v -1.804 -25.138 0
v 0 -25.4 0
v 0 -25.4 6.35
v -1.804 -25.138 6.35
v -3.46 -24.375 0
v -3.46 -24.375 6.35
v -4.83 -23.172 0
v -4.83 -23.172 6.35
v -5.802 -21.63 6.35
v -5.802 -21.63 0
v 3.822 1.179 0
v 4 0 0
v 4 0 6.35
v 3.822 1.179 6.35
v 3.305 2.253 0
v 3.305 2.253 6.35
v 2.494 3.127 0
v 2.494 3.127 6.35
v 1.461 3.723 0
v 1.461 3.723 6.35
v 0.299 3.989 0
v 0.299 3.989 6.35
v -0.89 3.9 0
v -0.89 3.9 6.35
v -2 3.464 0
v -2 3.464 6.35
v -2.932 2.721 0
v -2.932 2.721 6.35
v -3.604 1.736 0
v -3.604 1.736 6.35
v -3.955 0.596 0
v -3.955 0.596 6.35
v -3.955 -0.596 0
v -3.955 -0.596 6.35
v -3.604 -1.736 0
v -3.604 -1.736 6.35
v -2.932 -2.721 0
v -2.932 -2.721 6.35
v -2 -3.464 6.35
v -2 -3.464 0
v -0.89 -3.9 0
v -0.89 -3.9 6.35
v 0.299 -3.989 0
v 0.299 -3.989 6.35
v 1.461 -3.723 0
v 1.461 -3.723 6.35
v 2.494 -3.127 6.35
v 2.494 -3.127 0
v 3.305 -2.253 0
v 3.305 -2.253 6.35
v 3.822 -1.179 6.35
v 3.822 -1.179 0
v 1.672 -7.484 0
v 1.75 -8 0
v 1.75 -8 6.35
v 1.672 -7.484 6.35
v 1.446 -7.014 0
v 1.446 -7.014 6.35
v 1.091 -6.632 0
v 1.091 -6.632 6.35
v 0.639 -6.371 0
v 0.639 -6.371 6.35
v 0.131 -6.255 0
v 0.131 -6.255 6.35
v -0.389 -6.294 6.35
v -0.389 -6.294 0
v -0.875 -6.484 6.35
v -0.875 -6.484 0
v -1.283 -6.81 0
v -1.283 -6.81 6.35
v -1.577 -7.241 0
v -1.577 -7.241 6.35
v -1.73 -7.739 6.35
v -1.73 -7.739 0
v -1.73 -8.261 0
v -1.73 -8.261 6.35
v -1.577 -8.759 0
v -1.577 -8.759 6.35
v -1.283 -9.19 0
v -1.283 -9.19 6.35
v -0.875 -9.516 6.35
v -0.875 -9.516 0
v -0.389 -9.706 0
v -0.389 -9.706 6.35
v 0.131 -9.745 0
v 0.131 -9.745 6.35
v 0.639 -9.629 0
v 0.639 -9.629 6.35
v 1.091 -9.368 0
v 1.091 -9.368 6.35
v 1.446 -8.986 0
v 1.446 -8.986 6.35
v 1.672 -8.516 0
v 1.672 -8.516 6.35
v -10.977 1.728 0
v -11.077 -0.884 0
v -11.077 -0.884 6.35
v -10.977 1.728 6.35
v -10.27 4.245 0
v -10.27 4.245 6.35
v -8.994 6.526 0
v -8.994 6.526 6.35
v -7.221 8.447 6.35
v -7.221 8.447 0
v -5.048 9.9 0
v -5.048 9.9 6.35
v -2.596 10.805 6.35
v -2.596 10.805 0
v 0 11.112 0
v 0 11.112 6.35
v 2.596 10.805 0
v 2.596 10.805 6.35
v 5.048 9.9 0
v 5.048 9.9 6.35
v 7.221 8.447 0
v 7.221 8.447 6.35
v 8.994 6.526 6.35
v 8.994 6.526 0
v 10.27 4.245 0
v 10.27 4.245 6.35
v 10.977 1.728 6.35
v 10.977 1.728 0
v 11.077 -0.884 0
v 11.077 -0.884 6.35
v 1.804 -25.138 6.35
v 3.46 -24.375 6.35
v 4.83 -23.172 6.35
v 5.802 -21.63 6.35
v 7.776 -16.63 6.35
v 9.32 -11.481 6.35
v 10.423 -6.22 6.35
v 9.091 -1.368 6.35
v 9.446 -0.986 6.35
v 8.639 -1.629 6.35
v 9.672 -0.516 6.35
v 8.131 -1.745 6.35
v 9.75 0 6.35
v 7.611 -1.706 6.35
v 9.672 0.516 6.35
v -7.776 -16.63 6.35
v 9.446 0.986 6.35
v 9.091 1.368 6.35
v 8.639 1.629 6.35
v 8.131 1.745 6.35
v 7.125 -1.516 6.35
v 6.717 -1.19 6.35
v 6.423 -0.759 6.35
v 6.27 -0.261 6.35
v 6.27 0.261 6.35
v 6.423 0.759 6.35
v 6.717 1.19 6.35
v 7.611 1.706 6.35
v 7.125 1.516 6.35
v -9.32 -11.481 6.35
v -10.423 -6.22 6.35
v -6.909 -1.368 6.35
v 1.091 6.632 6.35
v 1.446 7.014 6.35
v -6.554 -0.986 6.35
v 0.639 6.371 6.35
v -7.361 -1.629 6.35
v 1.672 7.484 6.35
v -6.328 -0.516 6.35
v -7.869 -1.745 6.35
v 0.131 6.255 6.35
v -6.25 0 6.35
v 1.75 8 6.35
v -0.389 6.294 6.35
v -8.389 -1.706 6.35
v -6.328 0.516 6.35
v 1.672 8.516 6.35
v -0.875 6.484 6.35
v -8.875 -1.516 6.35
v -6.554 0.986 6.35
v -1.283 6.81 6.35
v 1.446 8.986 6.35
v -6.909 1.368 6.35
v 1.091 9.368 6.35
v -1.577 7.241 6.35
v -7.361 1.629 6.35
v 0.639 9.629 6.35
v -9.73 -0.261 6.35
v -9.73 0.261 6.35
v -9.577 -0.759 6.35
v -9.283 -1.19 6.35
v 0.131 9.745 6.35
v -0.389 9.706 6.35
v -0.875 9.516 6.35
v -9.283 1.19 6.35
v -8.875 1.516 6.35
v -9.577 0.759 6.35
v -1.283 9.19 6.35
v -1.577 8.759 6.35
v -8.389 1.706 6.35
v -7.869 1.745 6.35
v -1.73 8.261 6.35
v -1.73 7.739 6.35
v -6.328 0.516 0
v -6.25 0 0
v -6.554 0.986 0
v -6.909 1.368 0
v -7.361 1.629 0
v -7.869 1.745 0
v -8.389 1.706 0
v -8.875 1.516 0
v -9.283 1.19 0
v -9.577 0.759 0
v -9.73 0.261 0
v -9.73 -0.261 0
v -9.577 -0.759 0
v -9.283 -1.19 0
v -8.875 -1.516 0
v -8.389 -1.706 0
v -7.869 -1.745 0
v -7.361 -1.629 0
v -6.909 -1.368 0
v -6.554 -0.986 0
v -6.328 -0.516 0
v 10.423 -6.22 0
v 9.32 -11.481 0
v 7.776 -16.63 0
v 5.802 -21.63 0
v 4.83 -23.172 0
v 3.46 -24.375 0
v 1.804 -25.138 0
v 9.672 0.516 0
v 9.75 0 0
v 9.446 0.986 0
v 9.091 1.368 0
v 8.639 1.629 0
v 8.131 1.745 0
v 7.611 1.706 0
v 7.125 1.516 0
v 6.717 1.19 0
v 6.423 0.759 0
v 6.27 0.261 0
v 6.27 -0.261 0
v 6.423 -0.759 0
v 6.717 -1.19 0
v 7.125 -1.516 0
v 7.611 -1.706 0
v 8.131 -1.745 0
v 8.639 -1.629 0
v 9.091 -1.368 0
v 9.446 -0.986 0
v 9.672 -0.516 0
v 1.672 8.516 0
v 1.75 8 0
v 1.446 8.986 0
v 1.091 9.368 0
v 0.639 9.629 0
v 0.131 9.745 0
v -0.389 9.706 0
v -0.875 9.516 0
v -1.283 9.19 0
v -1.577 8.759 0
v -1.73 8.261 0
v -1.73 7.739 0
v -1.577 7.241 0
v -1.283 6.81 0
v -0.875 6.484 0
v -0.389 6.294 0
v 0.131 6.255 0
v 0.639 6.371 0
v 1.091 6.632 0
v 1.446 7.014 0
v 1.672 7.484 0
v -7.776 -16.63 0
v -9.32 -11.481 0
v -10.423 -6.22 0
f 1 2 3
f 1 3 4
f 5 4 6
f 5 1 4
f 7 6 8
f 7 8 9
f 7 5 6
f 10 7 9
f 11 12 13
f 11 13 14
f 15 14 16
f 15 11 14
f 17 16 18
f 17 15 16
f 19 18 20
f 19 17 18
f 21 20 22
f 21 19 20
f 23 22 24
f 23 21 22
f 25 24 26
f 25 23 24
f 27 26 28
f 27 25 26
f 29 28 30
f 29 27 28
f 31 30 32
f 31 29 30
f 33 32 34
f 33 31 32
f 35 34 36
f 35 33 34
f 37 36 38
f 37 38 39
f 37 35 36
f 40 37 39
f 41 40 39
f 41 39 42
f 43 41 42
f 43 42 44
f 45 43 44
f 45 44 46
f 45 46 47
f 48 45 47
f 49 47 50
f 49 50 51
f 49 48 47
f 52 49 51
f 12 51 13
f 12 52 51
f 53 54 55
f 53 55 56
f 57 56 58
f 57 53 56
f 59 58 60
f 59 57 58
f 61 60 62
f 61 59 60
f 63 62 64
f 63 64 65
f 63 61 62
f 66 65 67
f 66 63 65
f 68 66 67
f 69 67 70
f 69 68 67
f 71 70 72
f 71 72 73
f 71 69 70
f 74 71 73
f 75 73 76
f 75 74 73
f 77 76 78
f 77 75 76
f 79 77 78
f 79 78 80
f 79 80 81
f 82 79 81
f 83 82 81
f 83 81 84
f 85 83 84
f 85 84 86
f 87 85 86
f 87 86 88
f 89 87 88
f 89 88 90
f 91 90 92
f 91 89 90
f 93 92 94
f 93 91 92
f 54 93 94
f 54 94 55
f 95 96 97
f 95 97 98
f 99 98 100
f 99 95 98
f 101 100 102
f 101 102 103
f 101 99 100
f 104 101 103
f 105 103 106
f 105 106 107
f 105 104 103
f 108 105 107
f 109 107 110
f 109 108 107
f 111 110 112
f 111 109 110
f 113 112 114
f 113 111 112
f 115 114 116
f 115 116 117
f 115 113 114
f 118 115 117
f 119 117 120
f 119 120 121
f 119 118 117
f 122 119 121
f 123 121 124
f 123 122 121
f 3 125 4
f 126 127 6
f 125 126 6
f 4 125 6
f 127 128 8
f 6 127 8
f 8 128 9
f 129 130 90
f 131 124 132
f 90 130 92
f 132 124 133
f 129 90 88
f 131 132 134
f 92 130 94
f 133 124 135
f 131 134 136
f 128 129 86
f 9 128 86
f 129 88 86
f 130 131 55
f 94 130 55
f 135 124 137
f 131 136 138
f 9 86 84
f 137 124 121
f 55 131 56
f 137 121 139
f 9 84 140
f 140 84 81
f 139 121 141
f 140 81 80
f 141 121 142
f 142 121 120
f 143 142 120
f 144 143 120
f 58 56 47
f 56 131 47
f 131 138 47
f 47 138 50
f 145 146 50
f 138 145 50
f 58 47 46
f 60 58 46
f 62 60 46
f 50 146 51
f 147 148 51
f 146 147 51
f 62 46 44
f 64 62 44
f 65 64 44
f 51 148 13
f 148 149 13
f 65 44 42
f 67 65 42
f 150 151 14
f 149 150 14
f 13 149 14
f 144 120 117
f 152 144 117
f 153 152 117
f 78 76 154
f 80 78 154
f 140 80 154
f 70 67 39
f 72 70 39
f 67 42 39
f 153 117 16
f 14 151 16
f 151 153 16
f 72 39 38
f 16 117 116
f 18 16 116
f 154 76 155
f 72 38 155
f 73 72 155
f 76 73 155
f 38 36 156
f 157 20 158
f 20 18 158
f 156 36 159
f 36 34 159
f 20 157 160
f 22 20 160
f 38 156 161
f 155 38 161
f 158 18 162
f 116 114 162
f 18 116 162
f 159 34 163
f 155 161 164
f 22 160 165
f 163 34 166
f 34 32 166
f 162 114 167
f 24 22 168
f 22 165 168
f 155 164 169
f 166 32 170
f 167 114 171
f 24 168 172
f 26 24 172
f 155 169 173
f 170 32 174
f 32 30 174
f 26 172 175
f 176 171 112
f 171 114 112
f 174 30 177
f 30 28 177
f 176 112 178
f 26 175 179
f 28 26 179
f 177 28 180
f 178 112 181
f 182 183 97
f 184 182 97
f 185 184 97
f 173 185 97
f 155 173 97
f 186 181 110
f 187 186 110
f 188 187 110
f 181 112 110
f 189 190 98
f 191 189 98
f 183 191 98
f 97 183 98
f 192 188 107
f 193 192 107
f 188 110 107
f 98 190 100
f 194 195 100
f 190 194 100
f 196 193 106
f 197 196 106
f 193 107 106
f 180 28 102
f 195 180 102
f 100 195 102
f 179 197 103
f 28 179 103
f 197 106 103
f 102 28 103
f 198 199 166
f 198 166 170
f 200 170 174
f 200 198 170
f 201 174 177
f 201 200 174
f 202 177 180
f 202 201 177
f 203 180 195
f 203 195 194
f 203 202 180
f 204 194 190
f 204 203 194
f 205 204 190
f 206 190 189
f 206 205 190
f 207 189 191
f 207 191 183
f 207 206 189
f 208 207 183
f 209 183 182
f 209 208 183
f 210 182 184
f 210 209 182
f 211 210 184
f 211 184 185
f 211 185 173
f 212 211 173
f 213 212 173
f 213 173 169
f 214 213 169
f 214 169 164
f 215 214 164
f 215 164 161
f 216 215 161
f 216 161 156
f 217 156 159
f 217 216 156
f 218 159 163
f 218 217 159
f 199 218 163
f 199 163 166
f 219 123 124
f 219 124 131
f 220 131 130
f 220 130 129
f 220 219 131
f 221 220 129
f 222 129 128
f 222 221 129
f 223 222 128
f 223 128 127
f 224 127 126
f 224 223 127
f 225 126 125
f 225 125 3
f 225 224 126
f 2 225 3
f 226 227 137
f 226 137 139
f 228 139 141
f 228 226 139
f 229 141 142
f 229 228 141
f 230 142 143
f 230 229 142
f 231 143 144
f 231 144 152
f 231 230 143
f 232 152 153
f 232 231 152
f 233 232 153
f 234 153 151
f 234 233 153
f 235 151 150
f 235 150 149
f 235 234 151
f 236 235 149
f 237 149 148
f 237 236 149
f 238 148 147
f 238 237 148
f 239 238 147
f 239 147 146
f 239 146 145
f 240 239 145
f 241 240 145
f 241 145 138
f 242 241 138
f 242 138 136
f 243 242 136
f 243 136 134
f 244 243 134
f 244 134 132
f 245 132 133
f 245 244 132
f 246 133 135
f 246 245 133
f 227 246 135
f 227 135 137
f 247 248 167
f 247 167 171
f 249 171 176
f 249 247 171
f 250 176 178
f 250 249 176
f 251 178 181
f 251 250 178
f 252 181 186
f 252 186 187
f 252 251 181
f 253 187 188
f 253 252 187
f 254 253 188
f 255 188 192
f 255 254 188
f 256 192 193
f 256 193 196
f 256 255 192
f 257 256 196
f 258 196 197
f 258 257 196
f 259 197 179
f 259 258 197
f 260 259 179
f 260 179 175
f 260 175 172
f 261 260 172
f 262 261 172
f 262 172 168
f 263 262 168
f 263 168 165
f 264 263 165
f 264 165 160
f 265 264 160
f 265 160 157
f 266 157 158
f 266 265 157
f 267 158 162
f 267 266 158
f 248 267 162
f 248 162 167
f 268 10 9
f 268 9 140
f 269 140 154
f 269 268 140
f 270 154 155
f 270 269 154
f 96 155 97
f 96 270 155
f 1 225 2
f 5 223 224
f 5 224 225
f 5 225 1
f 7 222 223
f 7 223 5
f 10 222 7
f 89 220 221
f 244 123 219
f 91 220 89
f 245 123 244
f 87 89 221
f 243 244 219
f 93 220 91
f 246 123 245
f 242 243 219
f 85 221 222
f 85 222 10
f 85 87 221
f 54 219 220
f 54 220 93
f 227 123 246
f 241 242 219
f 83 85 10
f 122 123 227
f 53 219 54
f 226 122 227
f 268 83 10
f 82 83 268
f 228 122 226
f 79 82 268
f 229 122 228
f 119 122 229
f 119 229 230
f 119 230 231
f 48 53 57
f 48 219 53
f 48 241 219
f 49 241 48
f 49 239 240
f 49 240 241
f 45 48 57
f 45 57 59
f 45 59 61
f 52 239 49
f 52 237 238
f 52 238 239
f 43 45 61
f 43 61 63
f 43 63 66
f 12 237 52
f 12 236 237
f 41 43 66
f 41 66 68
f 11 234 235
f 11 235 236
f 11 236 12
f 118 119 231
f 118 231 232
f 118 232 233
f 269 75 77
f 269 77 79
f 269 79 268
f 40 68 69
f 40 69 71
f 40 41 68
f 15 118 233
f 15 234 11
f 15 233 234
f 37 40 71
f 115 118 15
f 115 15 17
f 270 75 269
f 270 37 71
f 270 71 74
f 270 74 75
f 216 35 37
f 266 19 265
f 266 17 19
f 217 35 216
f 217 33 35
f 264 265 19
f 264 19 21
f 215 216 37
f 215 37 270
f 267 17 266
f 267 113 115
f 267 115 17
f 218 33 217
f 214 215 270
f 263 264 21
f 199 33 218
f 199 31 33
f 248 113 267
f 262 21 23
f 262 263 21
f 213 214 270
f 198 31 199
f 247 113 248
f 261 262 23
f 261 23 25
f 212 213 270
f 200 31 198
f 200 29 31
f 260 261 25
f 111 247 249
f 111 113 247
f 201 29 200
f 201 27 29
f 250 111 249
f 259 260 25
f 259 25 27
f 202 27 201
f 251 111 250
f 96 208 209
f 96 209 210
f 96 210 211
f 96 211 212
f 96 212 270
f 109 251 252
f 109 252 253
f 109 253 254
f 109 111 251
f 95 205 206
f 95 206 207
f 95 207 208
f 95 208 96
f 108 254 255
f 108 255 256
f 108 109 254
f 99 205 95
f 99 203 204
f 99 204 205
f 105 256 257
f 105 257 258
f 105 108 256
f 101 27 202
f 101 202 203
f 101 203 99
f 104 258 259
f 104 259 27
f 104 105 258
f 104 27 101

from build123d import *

# Parameters (mm, degrees)
SKETCH1_R           = 4
SKETCH1_R_2         = 1.75
BOSS_EXTRUDE1_DEPTH = 6.35


with BuildPart() as part:
    # Sketch1 → Boss-Extrude1 (new body)
    with BuildSketch(Plane.XY):
        with BuildLine():
            ThreePointArc((-11.077287152, -0.883948864), (0, 11.1125), (11.077287152, -0.883948864))
            ThreePointArc((11.077287152, -0.883948864), (9.32030962, -11.480690637), (5.802388508, -21.6296875))
            ThreePointArc((5.802388508, -21.6296875), (3.459876036, -24.374636871), (0, -25.4))
            ThreePointArc((0, -25.4), (-3.459876036, -24.374636871), (-5.802388508, -21.6296875))
            ThreePointArc((-5.802388508, -21.6296875), (-9.32030962, -11.480690637), (-11.077287152, -0.883948864))
        make_face()
        Circle(SKETCH1_R, mode=Mode.SUBTRACT)
        with Locations((8, 0)):
            Circle(SKETCH1_R_2, mode=Mode.SUBTRACT)
        with Locations((0, -8)):
            Circle(SKETCH1_R_2, mode=Mode.SUBTRACT)
        with Locations((-8, 0)):
            Circle(SKETCH1_R_2, mode=Mode.SUBTRACT)
        with Locations((0, 8)):
            Circle(SKETCH1_R_2, mode=Mode.SUBTRACT)
    extrude(amount=BOSS_EXTRUDE1_DEPTH)


solid = part.part
